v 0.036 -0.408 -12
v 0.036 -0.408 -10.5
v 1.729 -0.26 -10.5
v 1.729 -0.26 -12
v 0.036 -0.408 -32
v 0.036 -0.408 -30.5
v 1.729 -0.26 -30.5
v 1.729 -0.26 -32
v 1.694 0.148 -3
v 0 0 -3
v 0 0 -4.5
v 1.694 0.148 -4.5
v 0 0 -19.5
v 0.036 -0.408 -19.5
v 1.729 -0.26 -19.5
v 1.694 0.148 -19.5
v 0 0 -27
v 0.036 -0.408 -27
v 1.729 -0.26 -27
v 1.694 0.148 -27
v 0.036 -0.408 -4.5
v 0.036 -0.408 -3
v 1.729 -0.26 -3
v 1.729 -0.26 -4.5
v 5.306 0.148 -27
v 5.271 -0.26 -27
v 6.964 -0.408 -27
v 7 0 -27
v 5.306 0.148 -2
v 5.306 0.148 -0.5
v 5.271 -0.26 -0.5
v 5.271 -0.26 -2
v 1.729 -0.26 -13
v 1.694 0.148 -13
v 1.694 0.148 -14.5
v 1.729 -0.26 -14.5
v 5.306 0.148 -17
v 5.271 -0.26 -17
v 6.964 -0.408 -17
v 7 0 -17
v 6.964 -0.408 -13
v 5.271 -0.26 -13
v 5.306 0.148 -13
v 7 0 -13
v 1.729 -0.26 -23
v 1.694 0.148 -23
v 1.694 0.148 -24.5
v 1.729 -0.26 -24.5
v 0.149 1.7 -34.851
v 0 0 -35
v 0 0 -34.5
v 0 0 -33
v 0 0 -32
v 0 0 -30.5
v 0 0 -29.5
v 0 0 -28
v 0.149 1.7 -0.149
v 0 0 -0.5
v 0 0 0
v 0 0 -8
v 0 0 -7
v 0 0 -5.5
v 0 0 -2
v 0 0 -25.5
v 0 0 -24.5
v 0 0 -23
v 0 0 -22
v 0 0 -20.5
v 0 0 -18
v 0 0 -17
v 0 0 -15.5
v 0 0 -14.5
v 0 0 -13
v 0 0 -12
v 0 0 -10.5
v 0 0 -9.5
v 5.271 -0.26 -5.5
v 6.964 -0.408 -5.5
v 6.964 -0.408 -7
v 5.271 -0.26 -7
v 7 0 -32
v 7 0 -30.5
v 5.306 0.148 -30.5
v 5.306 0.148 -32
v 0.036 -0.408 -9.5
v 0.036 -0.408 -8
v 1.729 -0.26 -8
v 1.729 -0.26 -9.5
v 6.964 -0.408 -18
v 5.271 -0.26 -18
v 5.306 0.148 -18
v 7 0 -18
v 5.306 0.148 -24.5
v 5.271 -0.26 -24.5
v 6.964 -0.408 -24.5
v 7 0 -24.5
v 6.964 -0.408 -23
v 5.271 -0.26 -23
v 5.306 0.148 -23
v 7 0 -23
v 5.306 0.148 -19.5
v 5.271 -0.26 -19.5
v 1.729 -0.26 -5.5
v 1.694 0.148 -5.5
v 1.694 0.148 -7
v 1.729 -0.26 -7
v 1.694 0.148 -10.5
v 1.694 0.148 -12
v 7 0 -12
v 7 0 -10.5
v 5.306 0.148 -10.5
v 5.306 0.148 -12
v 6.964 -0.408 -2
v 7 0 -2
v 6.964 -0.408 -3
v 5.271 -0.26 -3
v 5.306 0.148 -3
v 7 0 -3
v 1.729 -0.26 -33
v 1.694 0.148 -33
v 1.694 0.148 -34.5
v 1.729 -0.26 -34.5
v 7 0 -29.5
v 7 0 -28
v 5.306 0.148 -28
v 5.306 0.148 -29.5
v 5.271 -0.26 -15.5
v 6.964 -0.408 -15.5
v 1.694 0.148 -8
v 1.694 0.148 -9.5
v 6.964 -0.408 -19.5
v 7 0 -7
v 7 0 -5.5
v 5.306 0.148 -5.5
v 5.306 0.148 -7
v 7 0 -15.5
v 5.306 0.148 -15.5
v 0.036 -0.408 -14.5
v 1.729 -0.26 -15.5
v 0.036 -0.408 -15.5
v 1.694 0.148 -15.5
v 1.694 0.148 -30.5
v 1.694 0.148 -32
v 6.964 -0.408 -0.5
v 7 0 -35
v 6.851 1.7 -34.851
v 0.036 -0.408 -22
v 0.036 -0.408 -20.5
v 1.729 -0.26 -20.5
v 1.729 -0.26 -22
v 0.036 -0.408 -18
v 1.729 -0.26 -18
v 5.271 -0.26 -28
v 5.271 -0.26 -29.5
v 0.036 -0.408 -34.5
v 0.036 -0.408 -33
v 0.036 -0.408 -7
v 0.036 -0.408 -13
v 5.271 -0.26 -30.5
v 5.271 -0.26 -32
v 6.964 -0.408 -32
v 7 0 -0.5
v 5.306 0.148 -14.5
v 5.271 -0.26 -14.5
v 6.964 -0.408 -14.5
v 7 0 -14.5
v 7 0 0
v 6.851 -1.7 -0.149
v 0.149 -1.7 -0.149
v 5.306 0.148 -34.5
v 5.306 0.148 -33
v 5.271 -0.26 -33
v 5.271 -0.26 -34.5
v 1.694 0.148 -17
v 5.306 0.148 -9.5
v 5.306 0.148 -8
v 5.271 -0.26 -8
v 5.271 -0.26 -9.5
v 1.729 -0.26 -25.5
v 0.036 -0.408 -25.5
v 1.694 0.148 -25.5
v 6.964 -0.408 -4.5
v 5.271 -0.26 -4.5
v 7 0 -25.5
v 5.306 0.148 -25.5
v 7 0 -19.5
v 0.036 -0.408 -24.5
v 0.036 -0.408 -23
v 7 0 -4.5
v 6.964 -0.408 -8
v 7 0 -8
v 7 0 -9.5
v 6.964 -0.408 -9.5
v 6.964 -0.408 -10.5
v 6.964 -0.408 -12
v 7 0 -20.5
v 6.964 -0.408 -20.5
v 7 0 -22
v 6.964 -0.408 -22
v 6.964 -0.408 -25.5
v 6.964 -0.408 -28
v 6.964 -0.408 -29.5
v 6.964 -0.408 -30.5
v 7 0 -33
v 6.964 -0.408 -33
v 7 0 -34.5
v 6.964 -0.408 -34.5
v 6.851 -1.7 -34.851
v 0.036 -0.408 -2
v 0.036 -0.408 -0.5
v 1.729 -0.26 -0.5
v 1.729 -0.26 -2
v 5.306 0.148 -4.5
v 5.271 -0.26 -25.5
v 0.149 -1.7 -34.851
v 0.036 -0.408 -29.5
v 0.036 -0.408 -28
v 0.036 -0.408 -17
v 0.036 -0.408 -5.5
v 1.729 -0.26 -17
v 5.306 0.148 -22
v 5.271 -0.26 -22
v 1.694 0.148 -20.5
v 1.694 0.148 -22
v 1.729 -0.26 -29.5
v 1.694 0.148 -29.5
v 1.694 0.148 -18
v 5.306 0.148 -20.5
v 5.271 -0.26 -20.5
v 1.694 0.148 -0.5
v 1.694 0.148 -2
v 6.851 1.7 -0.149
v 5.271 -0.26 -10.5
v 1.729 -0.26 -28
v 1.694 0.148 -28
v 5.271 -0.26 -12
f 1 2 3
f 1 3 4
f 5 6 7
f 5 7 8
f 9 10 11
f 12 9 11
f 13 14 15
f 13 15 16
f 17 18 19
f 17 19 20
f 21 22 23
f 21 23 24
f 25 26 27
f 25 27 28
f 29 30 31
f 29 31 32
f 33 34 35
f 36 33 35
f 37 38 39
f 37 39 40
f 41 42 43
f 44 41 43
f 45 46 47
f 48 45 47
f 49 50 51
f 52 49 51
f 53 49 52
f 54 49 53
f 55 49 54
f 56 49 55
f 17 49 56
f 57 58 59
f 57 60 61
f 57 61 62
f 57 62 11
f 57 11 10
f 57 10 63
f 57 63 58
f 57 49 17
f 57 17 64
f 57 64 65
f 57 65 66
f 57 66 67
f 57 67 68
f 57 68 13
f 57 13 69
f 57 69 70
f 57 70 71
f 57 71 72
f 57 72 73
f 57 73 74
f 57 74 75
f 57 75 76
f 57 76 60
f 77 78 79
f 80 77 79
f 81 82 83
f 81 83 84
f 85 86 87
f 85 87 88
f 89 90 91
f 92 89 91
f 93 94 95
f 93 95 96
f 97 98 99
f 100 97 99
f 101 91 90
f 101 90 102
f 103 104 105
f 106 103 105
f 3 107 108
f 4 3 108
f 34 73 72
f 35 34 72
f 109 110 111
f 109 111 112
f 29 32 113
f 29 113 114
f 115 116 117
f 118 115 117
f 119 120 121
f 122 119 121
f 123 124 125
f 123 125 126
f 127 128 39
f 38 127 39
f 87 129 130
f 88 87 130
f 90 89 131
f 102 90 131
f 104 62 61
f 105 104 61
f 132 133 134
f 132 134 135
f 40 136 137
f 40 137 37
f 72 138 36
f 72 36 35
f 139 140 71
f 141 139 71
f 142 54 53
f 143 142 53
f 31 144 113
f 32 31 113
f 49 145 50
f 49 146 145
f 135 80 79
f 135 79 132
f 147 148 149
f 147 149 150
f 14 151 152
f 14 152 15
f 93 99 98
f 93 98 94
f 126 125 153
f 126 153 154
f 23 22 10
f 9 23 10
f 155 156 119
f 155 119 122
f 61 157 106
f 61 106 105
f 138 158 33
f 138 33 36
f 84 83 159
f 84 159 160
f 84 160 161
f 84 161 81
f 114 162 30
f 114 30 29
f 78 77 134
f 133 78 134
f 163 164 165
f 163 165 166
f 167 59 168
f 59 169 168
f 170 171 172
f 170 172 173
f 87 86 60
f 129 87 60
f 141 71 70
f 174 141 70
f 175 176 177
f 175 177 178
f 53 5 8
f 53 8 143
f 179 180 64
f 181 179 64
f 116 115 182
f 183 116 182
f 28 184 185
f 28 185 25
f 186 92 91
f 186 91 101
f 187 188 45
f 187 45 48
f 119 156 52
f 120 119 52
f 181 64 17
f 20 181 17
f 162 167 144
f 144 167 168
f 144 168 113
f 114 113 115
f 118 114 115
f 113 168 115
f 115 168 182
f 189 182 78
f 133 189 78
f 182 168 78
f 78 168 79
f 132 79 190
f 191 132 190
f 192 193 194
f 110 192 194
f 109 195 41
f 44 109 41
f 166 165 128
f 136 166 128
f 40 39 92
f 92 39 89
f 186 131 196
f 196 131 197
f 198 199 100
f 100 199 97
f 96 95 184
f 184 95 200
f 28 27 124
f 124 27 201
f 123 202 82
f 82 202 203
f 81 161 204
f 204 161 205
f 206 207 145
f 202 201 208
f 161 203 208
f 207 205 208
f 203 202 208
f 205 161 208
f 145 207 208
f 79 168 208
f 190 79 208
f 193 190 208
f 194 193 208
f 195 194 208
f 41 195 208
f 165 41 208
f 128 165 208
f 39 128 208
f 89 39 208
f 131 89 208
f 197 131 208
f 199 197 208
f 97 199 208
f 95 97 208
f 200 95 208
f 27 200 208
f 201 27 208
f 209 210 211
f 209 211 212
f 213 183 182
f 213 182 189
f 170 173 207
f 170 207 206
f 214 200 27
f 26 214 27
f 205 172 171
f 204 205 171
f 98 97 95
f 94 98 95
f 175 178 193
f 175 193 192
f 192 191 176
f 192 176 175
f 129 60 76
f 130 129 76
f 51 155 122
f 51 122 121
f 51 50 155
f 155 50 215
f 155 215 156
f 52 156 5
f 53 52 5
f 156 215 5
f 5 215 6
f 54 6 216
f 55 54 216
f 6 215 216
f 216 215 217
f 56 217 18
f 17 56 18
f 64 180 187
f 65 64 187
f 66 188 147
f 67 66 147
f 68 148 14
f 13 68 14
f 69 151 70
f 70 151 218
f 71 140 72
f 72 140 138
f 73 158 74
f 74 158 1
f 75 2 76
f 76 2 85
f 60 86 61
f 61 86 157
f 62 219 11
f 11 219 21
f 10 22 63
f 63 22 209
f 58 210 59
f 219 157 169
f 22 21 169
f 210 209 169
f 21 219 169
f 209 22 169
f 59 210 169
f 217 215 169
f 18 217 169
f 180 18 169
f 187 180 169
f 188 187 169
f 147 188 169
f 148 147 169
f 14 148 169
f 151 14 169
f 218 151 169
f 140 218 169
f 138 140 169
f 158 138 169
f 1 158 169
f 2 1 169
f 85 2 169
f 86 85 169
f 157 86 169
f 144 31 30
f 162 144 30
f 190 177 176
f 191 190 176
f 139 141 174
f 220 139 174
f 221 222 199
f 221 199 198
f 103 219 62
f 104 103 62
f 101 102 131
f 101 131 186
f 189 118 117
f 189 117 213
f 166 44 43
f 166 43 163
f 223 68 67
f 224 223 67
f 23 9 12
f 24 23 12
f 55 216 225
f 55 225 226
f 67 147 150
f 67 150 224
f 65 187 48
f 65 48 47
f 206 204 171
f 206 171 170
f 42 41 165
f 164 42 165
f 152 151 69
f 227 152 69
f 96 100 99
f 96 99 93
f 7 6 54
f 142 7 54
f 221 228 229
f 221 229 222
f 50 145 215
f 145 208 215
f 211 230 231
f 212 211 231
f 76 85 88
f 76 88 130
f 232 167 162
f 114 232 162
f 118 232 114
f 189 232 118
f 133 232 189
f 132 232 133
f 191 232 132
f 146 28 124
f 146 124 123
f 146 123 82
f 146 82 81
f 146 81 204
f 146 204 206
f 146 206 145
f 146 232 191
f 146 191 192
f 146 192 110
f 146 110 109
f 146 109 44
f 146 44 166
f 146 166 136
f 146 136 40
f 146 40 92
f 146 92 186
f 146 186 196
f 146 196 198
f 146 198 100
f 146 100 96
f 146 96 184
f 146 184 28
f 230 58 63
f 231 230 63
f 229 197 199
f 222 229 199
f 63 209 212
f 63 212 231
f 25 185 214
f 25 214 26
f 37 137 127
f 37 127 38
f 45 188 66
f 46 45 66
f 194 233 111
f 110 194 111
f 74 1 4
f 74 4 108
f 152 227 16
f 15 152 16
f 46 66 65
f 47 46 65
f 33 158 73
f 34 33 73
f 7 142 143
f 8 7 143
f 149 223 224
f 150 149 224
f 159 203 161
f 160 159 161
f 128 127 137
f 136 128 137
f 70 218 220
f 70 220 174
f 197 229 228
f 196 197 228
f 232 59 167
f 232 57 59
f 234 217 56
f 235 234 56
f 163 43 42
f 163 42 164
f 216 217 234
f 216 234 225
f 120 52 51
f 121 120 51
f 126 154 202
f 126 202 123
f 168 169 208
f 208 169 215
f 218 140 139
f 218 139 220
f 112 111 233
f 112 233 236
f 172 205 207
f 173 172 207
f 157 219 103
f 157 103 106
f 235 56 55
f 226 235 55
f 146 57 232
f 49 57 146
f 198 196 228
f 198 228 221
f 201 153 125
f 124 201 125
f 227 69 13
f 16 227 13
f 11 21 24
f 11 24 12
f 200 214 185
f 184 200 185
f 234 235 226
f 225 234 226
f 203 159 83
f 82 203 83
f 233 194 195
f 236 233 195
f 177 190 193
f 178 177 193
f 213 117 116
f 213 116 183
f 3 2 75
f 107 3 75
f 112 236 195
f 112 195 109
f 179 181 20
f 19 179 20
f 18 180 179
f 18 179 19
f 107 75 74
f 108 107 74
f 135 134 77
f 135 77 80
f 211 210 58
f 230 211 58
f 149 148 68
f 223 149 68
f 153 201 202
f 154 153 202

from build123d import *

# Parameters (mm, degrees)
SKETCH1_W                     = 7
SKETCH1_H                     = 35
BOSS_EXTRUDE1_DEPTH           = 1.7
BOSS_EXTRUDE1_TAPER           = 5
BOSS_EXTRUDE1_OTHER_WAY_DEPTH = 1.7
BOSS_EXTRUDE1_OTHER_WAY_TAPER = 5
SKETCH2_W                     = 1.5
SKETCH2_H                     = 0.41
CUT_EXTRUDE1_DEPTH            = 1.7


with BuildPart() as part:
    # Sketch1 → Boss-Extrude1 (new body)
    with BuildSketch(Plane(origin=(0, 0, 0), x_dir=(1, 0, 0), z_dir=(0, 1, 0))):
        with Locations((3.5, 17.5)):
            Rectangle(SKETCH1_W, SKETCH1_H)
    extrude(amount=BOSS_EXTRUDE1_DEPTH, taper=BOSS_EXTRUDE1_TAPER)

    # Sketch1 → Boss-Extrude1 other way (add)
    with BuildSketch(Plane(origin=(0, 0, 0), x_dir=(1, 0, 0), z_dir=(0, 1, 0))):
        with Locations((3.5, 17.5)):
            Rectangle(SKETCH1_W, SKETCH1_H)
    extrude(amount=-BOSS_EXTRUDE1_OTHER_WAY_DEPTH, taper=BOSS_EXTRUDE1_OTHER_WAY_TAPER)

    # Sketch2 → Cut-Extrude1 (cut)
    with BuildSketch(Plane(origin=(6.946827136, -0.607768622, 0), x_dir=(0, 0, -1), z_dir=(0.996194698, -0.087155743, 0))):
        with Locations((1.25, 0.405090199)):
            Rectangle(SKETCH2_W, SKETCH2_H)
        with Locations((3.75, 0.405090199)):
            Rectangle(SKETCH2_W, SKETCH2_H)
        with Locations((6.25, 0.405090199)):
            Rectangle(SKETCH2_W, SKETCH2_H)
        with Locations((8.75, 0.405090199)):
            Rectangle(SKETCH2_W, SKETCH2_H)
        with Locations((11.25, 0.405090199)):
            Rectangle(SKETCH2_W, SKETCH2_H)
        with Locations((13.75, 0.405090199)):
            Rectangle(SKETCH2_W, SKETCH2_H)
        with Locations((16.25, 0.405090199)):
            Rectangle(SKETCH2_W, SKETCH2_H)
        with Locations((18.75, 0.405090199)):
            Rectangle(SKETCH2_W, SKETCH2_H)
        with Locations((21.25, 0.405090199)):
            Rectangle(SKETCH2_W, SKETCH2_H)
        with Locations((23.75, 0.405090199)):
            Rectangle(SKETCH2_W, SKETCH2_H)
        with Locations((26.25, 0.405090199)):
            Rectangle(SKETCH2_W, SKETCH2_H)
        with Locations((28.75, 0.405090199)):
            Rectangle(SKETCH2_W, SKETCH2_H)
        with Locations((31.25, 0.405090199)):
            Rectangle(SKETCH2_W, SKETCH2_H)
        with Locations((33.75, 0.405090199)):
            Rectangle(SKETCH2_W, SKETCH2_H)
    cut_extrude1 = extrude(amount=-CUT_EXTRUDE1_DEPTH, mode=Mode.SUBTRACT)

    # Mirror1: Cut-Extrude1 across plane
    add(cut_extrude1.mirror(Plane(origin=(3.5, 0, 0), x_dir=(0, 0, 1), z_dir=(1, 0, 0))), mode=Mode.SUBTRACT)


solid = part.part
